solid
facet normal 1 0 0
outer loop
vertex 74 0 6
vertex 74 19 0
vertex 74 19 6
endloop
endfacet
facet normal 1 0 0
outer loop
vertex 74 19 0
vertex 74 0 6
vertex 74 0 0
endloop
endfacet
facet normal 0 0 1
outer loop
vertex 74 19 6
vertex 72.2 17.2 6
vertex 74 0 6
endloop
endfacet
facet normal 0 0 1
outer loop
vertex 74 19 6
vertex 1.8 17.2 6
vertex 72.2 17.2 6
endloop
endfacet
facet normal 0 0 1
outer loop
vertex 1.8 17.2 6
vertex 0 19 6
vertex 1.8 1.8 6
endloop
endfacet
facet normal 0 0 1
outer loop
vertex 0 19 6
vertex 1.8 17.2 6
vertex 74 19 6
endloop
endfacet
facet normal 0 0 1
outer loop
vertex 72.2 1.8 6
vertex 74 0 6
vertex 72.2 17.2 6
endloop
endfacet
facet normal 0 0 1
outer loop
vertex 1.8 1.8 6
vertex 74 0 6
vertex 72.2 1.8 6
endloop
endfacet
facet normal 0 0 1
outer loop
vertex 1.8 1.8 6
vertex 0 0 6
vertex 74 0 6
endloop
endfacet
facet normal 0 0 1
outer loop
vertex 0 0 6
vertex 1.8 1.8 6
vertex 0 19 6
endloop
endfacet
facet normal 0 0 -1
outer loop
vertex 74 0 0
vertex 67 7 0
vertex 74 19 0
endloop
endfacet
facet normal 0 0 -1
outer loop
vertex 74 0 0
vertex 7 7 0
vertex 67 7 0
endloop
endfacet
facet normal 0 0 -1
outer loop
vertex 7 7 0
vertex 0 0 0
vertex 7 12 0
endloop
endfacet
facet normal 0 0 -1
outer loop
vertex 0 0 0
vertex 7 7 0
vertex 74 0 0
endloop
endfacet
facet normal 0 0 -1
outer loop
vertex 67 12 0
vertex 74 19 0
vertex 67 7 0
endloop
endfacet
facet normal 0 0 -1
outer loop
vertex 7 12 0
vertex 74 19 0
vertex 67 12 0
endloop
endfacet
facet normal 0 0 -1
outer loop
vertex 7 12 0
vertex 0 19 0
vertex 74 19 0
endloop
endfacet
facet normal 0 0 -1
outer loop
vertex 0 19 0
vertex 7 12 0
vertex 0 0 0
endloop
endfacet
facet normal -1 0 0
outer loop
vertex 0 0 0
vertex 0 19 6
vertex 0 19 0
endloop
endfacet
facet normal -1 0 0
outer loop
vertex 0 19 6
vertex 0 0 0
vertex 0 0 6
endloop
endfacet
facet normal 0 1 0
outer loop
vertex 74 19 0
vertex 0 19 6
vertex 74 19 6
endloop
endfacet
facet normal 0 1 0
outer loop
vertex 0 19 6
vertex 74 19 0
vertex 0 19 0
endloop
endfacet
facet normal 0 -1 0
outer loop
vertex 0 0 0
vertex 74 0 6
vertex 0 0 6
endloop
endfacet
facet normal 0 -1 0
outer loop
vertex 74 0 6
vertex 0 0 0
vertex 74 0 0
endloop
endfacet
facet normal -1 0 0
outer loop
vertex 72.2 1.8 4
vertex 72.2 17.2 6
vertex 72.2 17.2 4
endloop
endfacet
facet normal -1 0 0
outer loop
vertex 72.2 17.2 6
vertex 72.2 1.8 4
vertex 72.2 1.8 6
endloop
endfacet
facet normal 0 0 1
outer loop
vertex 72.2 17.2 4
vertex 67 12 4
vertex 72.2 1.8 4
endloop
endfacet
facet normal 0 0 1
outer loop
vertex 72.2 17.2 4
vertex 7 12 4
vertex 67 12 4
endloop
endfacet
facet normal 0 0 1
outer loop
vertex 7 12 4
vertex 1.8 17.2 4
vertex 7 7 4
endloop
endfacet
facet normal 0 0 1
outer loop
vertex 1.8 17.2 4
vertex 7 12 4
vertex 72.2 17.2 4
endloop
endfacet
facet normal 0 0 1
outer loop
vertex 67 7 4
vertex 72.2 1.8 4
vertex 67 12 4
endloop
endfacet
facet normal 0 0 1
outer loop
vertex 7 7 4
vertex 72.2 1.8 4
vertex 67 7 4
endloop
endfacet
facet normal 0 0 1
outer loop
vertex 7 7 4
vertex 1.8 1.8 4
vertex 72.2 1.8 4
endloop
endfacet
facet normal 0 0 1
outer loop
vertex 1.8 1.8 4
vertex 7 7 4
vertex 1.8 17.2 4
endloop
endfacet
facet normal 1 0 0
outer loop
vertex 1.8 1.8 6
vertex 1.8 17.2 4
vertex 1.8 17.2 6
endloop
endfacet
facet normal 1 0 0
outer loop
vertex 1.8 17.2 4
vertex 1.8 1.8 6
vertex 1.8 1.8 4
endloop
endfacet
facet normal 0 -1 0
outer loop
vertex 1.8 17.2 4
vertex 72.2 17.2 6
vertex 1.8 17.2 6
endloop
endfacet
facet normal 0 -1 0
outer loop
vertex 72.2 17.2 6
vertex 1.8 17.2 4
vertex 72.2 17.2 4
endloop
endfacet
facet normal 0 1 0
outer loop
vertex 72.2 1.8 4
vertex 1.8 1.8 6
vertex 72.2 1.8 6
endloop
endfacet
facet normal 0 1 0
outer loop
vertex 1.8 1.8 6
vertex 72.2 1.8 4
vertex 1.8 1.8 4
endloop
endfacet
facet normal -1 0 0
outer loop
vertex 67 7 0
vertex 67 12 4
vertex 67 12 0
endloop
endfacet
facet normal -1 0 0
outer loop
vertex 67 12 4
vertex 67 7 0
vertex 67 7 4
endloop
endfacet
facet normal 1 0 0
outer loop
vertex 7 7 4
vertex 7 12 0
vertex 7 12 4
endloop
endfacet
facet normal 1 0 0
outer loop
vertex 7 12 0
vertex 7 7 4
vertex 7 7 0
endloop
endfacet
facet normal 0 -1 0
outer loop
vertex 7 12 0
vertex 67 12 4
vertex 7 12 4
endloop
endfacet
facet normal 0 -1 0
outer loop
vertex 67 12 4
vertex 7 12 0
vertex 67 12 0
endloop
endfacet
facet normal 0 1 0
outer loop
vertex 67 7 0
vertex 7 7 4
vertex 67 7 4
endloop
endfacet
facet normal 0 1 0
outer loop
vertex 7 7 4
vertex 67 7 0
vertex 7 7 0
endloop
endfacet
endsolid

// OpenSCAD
difference(){
    cube( [ 74, 19, 6 ] );
    translate( [ 1.8, 1.8, 4 ] )
        cube( [ 70.4, 15.4, 3 ] );
    translate( [ 7, 7, -1 ] )
        cube( [ 60, 5, 6 ] );
}
